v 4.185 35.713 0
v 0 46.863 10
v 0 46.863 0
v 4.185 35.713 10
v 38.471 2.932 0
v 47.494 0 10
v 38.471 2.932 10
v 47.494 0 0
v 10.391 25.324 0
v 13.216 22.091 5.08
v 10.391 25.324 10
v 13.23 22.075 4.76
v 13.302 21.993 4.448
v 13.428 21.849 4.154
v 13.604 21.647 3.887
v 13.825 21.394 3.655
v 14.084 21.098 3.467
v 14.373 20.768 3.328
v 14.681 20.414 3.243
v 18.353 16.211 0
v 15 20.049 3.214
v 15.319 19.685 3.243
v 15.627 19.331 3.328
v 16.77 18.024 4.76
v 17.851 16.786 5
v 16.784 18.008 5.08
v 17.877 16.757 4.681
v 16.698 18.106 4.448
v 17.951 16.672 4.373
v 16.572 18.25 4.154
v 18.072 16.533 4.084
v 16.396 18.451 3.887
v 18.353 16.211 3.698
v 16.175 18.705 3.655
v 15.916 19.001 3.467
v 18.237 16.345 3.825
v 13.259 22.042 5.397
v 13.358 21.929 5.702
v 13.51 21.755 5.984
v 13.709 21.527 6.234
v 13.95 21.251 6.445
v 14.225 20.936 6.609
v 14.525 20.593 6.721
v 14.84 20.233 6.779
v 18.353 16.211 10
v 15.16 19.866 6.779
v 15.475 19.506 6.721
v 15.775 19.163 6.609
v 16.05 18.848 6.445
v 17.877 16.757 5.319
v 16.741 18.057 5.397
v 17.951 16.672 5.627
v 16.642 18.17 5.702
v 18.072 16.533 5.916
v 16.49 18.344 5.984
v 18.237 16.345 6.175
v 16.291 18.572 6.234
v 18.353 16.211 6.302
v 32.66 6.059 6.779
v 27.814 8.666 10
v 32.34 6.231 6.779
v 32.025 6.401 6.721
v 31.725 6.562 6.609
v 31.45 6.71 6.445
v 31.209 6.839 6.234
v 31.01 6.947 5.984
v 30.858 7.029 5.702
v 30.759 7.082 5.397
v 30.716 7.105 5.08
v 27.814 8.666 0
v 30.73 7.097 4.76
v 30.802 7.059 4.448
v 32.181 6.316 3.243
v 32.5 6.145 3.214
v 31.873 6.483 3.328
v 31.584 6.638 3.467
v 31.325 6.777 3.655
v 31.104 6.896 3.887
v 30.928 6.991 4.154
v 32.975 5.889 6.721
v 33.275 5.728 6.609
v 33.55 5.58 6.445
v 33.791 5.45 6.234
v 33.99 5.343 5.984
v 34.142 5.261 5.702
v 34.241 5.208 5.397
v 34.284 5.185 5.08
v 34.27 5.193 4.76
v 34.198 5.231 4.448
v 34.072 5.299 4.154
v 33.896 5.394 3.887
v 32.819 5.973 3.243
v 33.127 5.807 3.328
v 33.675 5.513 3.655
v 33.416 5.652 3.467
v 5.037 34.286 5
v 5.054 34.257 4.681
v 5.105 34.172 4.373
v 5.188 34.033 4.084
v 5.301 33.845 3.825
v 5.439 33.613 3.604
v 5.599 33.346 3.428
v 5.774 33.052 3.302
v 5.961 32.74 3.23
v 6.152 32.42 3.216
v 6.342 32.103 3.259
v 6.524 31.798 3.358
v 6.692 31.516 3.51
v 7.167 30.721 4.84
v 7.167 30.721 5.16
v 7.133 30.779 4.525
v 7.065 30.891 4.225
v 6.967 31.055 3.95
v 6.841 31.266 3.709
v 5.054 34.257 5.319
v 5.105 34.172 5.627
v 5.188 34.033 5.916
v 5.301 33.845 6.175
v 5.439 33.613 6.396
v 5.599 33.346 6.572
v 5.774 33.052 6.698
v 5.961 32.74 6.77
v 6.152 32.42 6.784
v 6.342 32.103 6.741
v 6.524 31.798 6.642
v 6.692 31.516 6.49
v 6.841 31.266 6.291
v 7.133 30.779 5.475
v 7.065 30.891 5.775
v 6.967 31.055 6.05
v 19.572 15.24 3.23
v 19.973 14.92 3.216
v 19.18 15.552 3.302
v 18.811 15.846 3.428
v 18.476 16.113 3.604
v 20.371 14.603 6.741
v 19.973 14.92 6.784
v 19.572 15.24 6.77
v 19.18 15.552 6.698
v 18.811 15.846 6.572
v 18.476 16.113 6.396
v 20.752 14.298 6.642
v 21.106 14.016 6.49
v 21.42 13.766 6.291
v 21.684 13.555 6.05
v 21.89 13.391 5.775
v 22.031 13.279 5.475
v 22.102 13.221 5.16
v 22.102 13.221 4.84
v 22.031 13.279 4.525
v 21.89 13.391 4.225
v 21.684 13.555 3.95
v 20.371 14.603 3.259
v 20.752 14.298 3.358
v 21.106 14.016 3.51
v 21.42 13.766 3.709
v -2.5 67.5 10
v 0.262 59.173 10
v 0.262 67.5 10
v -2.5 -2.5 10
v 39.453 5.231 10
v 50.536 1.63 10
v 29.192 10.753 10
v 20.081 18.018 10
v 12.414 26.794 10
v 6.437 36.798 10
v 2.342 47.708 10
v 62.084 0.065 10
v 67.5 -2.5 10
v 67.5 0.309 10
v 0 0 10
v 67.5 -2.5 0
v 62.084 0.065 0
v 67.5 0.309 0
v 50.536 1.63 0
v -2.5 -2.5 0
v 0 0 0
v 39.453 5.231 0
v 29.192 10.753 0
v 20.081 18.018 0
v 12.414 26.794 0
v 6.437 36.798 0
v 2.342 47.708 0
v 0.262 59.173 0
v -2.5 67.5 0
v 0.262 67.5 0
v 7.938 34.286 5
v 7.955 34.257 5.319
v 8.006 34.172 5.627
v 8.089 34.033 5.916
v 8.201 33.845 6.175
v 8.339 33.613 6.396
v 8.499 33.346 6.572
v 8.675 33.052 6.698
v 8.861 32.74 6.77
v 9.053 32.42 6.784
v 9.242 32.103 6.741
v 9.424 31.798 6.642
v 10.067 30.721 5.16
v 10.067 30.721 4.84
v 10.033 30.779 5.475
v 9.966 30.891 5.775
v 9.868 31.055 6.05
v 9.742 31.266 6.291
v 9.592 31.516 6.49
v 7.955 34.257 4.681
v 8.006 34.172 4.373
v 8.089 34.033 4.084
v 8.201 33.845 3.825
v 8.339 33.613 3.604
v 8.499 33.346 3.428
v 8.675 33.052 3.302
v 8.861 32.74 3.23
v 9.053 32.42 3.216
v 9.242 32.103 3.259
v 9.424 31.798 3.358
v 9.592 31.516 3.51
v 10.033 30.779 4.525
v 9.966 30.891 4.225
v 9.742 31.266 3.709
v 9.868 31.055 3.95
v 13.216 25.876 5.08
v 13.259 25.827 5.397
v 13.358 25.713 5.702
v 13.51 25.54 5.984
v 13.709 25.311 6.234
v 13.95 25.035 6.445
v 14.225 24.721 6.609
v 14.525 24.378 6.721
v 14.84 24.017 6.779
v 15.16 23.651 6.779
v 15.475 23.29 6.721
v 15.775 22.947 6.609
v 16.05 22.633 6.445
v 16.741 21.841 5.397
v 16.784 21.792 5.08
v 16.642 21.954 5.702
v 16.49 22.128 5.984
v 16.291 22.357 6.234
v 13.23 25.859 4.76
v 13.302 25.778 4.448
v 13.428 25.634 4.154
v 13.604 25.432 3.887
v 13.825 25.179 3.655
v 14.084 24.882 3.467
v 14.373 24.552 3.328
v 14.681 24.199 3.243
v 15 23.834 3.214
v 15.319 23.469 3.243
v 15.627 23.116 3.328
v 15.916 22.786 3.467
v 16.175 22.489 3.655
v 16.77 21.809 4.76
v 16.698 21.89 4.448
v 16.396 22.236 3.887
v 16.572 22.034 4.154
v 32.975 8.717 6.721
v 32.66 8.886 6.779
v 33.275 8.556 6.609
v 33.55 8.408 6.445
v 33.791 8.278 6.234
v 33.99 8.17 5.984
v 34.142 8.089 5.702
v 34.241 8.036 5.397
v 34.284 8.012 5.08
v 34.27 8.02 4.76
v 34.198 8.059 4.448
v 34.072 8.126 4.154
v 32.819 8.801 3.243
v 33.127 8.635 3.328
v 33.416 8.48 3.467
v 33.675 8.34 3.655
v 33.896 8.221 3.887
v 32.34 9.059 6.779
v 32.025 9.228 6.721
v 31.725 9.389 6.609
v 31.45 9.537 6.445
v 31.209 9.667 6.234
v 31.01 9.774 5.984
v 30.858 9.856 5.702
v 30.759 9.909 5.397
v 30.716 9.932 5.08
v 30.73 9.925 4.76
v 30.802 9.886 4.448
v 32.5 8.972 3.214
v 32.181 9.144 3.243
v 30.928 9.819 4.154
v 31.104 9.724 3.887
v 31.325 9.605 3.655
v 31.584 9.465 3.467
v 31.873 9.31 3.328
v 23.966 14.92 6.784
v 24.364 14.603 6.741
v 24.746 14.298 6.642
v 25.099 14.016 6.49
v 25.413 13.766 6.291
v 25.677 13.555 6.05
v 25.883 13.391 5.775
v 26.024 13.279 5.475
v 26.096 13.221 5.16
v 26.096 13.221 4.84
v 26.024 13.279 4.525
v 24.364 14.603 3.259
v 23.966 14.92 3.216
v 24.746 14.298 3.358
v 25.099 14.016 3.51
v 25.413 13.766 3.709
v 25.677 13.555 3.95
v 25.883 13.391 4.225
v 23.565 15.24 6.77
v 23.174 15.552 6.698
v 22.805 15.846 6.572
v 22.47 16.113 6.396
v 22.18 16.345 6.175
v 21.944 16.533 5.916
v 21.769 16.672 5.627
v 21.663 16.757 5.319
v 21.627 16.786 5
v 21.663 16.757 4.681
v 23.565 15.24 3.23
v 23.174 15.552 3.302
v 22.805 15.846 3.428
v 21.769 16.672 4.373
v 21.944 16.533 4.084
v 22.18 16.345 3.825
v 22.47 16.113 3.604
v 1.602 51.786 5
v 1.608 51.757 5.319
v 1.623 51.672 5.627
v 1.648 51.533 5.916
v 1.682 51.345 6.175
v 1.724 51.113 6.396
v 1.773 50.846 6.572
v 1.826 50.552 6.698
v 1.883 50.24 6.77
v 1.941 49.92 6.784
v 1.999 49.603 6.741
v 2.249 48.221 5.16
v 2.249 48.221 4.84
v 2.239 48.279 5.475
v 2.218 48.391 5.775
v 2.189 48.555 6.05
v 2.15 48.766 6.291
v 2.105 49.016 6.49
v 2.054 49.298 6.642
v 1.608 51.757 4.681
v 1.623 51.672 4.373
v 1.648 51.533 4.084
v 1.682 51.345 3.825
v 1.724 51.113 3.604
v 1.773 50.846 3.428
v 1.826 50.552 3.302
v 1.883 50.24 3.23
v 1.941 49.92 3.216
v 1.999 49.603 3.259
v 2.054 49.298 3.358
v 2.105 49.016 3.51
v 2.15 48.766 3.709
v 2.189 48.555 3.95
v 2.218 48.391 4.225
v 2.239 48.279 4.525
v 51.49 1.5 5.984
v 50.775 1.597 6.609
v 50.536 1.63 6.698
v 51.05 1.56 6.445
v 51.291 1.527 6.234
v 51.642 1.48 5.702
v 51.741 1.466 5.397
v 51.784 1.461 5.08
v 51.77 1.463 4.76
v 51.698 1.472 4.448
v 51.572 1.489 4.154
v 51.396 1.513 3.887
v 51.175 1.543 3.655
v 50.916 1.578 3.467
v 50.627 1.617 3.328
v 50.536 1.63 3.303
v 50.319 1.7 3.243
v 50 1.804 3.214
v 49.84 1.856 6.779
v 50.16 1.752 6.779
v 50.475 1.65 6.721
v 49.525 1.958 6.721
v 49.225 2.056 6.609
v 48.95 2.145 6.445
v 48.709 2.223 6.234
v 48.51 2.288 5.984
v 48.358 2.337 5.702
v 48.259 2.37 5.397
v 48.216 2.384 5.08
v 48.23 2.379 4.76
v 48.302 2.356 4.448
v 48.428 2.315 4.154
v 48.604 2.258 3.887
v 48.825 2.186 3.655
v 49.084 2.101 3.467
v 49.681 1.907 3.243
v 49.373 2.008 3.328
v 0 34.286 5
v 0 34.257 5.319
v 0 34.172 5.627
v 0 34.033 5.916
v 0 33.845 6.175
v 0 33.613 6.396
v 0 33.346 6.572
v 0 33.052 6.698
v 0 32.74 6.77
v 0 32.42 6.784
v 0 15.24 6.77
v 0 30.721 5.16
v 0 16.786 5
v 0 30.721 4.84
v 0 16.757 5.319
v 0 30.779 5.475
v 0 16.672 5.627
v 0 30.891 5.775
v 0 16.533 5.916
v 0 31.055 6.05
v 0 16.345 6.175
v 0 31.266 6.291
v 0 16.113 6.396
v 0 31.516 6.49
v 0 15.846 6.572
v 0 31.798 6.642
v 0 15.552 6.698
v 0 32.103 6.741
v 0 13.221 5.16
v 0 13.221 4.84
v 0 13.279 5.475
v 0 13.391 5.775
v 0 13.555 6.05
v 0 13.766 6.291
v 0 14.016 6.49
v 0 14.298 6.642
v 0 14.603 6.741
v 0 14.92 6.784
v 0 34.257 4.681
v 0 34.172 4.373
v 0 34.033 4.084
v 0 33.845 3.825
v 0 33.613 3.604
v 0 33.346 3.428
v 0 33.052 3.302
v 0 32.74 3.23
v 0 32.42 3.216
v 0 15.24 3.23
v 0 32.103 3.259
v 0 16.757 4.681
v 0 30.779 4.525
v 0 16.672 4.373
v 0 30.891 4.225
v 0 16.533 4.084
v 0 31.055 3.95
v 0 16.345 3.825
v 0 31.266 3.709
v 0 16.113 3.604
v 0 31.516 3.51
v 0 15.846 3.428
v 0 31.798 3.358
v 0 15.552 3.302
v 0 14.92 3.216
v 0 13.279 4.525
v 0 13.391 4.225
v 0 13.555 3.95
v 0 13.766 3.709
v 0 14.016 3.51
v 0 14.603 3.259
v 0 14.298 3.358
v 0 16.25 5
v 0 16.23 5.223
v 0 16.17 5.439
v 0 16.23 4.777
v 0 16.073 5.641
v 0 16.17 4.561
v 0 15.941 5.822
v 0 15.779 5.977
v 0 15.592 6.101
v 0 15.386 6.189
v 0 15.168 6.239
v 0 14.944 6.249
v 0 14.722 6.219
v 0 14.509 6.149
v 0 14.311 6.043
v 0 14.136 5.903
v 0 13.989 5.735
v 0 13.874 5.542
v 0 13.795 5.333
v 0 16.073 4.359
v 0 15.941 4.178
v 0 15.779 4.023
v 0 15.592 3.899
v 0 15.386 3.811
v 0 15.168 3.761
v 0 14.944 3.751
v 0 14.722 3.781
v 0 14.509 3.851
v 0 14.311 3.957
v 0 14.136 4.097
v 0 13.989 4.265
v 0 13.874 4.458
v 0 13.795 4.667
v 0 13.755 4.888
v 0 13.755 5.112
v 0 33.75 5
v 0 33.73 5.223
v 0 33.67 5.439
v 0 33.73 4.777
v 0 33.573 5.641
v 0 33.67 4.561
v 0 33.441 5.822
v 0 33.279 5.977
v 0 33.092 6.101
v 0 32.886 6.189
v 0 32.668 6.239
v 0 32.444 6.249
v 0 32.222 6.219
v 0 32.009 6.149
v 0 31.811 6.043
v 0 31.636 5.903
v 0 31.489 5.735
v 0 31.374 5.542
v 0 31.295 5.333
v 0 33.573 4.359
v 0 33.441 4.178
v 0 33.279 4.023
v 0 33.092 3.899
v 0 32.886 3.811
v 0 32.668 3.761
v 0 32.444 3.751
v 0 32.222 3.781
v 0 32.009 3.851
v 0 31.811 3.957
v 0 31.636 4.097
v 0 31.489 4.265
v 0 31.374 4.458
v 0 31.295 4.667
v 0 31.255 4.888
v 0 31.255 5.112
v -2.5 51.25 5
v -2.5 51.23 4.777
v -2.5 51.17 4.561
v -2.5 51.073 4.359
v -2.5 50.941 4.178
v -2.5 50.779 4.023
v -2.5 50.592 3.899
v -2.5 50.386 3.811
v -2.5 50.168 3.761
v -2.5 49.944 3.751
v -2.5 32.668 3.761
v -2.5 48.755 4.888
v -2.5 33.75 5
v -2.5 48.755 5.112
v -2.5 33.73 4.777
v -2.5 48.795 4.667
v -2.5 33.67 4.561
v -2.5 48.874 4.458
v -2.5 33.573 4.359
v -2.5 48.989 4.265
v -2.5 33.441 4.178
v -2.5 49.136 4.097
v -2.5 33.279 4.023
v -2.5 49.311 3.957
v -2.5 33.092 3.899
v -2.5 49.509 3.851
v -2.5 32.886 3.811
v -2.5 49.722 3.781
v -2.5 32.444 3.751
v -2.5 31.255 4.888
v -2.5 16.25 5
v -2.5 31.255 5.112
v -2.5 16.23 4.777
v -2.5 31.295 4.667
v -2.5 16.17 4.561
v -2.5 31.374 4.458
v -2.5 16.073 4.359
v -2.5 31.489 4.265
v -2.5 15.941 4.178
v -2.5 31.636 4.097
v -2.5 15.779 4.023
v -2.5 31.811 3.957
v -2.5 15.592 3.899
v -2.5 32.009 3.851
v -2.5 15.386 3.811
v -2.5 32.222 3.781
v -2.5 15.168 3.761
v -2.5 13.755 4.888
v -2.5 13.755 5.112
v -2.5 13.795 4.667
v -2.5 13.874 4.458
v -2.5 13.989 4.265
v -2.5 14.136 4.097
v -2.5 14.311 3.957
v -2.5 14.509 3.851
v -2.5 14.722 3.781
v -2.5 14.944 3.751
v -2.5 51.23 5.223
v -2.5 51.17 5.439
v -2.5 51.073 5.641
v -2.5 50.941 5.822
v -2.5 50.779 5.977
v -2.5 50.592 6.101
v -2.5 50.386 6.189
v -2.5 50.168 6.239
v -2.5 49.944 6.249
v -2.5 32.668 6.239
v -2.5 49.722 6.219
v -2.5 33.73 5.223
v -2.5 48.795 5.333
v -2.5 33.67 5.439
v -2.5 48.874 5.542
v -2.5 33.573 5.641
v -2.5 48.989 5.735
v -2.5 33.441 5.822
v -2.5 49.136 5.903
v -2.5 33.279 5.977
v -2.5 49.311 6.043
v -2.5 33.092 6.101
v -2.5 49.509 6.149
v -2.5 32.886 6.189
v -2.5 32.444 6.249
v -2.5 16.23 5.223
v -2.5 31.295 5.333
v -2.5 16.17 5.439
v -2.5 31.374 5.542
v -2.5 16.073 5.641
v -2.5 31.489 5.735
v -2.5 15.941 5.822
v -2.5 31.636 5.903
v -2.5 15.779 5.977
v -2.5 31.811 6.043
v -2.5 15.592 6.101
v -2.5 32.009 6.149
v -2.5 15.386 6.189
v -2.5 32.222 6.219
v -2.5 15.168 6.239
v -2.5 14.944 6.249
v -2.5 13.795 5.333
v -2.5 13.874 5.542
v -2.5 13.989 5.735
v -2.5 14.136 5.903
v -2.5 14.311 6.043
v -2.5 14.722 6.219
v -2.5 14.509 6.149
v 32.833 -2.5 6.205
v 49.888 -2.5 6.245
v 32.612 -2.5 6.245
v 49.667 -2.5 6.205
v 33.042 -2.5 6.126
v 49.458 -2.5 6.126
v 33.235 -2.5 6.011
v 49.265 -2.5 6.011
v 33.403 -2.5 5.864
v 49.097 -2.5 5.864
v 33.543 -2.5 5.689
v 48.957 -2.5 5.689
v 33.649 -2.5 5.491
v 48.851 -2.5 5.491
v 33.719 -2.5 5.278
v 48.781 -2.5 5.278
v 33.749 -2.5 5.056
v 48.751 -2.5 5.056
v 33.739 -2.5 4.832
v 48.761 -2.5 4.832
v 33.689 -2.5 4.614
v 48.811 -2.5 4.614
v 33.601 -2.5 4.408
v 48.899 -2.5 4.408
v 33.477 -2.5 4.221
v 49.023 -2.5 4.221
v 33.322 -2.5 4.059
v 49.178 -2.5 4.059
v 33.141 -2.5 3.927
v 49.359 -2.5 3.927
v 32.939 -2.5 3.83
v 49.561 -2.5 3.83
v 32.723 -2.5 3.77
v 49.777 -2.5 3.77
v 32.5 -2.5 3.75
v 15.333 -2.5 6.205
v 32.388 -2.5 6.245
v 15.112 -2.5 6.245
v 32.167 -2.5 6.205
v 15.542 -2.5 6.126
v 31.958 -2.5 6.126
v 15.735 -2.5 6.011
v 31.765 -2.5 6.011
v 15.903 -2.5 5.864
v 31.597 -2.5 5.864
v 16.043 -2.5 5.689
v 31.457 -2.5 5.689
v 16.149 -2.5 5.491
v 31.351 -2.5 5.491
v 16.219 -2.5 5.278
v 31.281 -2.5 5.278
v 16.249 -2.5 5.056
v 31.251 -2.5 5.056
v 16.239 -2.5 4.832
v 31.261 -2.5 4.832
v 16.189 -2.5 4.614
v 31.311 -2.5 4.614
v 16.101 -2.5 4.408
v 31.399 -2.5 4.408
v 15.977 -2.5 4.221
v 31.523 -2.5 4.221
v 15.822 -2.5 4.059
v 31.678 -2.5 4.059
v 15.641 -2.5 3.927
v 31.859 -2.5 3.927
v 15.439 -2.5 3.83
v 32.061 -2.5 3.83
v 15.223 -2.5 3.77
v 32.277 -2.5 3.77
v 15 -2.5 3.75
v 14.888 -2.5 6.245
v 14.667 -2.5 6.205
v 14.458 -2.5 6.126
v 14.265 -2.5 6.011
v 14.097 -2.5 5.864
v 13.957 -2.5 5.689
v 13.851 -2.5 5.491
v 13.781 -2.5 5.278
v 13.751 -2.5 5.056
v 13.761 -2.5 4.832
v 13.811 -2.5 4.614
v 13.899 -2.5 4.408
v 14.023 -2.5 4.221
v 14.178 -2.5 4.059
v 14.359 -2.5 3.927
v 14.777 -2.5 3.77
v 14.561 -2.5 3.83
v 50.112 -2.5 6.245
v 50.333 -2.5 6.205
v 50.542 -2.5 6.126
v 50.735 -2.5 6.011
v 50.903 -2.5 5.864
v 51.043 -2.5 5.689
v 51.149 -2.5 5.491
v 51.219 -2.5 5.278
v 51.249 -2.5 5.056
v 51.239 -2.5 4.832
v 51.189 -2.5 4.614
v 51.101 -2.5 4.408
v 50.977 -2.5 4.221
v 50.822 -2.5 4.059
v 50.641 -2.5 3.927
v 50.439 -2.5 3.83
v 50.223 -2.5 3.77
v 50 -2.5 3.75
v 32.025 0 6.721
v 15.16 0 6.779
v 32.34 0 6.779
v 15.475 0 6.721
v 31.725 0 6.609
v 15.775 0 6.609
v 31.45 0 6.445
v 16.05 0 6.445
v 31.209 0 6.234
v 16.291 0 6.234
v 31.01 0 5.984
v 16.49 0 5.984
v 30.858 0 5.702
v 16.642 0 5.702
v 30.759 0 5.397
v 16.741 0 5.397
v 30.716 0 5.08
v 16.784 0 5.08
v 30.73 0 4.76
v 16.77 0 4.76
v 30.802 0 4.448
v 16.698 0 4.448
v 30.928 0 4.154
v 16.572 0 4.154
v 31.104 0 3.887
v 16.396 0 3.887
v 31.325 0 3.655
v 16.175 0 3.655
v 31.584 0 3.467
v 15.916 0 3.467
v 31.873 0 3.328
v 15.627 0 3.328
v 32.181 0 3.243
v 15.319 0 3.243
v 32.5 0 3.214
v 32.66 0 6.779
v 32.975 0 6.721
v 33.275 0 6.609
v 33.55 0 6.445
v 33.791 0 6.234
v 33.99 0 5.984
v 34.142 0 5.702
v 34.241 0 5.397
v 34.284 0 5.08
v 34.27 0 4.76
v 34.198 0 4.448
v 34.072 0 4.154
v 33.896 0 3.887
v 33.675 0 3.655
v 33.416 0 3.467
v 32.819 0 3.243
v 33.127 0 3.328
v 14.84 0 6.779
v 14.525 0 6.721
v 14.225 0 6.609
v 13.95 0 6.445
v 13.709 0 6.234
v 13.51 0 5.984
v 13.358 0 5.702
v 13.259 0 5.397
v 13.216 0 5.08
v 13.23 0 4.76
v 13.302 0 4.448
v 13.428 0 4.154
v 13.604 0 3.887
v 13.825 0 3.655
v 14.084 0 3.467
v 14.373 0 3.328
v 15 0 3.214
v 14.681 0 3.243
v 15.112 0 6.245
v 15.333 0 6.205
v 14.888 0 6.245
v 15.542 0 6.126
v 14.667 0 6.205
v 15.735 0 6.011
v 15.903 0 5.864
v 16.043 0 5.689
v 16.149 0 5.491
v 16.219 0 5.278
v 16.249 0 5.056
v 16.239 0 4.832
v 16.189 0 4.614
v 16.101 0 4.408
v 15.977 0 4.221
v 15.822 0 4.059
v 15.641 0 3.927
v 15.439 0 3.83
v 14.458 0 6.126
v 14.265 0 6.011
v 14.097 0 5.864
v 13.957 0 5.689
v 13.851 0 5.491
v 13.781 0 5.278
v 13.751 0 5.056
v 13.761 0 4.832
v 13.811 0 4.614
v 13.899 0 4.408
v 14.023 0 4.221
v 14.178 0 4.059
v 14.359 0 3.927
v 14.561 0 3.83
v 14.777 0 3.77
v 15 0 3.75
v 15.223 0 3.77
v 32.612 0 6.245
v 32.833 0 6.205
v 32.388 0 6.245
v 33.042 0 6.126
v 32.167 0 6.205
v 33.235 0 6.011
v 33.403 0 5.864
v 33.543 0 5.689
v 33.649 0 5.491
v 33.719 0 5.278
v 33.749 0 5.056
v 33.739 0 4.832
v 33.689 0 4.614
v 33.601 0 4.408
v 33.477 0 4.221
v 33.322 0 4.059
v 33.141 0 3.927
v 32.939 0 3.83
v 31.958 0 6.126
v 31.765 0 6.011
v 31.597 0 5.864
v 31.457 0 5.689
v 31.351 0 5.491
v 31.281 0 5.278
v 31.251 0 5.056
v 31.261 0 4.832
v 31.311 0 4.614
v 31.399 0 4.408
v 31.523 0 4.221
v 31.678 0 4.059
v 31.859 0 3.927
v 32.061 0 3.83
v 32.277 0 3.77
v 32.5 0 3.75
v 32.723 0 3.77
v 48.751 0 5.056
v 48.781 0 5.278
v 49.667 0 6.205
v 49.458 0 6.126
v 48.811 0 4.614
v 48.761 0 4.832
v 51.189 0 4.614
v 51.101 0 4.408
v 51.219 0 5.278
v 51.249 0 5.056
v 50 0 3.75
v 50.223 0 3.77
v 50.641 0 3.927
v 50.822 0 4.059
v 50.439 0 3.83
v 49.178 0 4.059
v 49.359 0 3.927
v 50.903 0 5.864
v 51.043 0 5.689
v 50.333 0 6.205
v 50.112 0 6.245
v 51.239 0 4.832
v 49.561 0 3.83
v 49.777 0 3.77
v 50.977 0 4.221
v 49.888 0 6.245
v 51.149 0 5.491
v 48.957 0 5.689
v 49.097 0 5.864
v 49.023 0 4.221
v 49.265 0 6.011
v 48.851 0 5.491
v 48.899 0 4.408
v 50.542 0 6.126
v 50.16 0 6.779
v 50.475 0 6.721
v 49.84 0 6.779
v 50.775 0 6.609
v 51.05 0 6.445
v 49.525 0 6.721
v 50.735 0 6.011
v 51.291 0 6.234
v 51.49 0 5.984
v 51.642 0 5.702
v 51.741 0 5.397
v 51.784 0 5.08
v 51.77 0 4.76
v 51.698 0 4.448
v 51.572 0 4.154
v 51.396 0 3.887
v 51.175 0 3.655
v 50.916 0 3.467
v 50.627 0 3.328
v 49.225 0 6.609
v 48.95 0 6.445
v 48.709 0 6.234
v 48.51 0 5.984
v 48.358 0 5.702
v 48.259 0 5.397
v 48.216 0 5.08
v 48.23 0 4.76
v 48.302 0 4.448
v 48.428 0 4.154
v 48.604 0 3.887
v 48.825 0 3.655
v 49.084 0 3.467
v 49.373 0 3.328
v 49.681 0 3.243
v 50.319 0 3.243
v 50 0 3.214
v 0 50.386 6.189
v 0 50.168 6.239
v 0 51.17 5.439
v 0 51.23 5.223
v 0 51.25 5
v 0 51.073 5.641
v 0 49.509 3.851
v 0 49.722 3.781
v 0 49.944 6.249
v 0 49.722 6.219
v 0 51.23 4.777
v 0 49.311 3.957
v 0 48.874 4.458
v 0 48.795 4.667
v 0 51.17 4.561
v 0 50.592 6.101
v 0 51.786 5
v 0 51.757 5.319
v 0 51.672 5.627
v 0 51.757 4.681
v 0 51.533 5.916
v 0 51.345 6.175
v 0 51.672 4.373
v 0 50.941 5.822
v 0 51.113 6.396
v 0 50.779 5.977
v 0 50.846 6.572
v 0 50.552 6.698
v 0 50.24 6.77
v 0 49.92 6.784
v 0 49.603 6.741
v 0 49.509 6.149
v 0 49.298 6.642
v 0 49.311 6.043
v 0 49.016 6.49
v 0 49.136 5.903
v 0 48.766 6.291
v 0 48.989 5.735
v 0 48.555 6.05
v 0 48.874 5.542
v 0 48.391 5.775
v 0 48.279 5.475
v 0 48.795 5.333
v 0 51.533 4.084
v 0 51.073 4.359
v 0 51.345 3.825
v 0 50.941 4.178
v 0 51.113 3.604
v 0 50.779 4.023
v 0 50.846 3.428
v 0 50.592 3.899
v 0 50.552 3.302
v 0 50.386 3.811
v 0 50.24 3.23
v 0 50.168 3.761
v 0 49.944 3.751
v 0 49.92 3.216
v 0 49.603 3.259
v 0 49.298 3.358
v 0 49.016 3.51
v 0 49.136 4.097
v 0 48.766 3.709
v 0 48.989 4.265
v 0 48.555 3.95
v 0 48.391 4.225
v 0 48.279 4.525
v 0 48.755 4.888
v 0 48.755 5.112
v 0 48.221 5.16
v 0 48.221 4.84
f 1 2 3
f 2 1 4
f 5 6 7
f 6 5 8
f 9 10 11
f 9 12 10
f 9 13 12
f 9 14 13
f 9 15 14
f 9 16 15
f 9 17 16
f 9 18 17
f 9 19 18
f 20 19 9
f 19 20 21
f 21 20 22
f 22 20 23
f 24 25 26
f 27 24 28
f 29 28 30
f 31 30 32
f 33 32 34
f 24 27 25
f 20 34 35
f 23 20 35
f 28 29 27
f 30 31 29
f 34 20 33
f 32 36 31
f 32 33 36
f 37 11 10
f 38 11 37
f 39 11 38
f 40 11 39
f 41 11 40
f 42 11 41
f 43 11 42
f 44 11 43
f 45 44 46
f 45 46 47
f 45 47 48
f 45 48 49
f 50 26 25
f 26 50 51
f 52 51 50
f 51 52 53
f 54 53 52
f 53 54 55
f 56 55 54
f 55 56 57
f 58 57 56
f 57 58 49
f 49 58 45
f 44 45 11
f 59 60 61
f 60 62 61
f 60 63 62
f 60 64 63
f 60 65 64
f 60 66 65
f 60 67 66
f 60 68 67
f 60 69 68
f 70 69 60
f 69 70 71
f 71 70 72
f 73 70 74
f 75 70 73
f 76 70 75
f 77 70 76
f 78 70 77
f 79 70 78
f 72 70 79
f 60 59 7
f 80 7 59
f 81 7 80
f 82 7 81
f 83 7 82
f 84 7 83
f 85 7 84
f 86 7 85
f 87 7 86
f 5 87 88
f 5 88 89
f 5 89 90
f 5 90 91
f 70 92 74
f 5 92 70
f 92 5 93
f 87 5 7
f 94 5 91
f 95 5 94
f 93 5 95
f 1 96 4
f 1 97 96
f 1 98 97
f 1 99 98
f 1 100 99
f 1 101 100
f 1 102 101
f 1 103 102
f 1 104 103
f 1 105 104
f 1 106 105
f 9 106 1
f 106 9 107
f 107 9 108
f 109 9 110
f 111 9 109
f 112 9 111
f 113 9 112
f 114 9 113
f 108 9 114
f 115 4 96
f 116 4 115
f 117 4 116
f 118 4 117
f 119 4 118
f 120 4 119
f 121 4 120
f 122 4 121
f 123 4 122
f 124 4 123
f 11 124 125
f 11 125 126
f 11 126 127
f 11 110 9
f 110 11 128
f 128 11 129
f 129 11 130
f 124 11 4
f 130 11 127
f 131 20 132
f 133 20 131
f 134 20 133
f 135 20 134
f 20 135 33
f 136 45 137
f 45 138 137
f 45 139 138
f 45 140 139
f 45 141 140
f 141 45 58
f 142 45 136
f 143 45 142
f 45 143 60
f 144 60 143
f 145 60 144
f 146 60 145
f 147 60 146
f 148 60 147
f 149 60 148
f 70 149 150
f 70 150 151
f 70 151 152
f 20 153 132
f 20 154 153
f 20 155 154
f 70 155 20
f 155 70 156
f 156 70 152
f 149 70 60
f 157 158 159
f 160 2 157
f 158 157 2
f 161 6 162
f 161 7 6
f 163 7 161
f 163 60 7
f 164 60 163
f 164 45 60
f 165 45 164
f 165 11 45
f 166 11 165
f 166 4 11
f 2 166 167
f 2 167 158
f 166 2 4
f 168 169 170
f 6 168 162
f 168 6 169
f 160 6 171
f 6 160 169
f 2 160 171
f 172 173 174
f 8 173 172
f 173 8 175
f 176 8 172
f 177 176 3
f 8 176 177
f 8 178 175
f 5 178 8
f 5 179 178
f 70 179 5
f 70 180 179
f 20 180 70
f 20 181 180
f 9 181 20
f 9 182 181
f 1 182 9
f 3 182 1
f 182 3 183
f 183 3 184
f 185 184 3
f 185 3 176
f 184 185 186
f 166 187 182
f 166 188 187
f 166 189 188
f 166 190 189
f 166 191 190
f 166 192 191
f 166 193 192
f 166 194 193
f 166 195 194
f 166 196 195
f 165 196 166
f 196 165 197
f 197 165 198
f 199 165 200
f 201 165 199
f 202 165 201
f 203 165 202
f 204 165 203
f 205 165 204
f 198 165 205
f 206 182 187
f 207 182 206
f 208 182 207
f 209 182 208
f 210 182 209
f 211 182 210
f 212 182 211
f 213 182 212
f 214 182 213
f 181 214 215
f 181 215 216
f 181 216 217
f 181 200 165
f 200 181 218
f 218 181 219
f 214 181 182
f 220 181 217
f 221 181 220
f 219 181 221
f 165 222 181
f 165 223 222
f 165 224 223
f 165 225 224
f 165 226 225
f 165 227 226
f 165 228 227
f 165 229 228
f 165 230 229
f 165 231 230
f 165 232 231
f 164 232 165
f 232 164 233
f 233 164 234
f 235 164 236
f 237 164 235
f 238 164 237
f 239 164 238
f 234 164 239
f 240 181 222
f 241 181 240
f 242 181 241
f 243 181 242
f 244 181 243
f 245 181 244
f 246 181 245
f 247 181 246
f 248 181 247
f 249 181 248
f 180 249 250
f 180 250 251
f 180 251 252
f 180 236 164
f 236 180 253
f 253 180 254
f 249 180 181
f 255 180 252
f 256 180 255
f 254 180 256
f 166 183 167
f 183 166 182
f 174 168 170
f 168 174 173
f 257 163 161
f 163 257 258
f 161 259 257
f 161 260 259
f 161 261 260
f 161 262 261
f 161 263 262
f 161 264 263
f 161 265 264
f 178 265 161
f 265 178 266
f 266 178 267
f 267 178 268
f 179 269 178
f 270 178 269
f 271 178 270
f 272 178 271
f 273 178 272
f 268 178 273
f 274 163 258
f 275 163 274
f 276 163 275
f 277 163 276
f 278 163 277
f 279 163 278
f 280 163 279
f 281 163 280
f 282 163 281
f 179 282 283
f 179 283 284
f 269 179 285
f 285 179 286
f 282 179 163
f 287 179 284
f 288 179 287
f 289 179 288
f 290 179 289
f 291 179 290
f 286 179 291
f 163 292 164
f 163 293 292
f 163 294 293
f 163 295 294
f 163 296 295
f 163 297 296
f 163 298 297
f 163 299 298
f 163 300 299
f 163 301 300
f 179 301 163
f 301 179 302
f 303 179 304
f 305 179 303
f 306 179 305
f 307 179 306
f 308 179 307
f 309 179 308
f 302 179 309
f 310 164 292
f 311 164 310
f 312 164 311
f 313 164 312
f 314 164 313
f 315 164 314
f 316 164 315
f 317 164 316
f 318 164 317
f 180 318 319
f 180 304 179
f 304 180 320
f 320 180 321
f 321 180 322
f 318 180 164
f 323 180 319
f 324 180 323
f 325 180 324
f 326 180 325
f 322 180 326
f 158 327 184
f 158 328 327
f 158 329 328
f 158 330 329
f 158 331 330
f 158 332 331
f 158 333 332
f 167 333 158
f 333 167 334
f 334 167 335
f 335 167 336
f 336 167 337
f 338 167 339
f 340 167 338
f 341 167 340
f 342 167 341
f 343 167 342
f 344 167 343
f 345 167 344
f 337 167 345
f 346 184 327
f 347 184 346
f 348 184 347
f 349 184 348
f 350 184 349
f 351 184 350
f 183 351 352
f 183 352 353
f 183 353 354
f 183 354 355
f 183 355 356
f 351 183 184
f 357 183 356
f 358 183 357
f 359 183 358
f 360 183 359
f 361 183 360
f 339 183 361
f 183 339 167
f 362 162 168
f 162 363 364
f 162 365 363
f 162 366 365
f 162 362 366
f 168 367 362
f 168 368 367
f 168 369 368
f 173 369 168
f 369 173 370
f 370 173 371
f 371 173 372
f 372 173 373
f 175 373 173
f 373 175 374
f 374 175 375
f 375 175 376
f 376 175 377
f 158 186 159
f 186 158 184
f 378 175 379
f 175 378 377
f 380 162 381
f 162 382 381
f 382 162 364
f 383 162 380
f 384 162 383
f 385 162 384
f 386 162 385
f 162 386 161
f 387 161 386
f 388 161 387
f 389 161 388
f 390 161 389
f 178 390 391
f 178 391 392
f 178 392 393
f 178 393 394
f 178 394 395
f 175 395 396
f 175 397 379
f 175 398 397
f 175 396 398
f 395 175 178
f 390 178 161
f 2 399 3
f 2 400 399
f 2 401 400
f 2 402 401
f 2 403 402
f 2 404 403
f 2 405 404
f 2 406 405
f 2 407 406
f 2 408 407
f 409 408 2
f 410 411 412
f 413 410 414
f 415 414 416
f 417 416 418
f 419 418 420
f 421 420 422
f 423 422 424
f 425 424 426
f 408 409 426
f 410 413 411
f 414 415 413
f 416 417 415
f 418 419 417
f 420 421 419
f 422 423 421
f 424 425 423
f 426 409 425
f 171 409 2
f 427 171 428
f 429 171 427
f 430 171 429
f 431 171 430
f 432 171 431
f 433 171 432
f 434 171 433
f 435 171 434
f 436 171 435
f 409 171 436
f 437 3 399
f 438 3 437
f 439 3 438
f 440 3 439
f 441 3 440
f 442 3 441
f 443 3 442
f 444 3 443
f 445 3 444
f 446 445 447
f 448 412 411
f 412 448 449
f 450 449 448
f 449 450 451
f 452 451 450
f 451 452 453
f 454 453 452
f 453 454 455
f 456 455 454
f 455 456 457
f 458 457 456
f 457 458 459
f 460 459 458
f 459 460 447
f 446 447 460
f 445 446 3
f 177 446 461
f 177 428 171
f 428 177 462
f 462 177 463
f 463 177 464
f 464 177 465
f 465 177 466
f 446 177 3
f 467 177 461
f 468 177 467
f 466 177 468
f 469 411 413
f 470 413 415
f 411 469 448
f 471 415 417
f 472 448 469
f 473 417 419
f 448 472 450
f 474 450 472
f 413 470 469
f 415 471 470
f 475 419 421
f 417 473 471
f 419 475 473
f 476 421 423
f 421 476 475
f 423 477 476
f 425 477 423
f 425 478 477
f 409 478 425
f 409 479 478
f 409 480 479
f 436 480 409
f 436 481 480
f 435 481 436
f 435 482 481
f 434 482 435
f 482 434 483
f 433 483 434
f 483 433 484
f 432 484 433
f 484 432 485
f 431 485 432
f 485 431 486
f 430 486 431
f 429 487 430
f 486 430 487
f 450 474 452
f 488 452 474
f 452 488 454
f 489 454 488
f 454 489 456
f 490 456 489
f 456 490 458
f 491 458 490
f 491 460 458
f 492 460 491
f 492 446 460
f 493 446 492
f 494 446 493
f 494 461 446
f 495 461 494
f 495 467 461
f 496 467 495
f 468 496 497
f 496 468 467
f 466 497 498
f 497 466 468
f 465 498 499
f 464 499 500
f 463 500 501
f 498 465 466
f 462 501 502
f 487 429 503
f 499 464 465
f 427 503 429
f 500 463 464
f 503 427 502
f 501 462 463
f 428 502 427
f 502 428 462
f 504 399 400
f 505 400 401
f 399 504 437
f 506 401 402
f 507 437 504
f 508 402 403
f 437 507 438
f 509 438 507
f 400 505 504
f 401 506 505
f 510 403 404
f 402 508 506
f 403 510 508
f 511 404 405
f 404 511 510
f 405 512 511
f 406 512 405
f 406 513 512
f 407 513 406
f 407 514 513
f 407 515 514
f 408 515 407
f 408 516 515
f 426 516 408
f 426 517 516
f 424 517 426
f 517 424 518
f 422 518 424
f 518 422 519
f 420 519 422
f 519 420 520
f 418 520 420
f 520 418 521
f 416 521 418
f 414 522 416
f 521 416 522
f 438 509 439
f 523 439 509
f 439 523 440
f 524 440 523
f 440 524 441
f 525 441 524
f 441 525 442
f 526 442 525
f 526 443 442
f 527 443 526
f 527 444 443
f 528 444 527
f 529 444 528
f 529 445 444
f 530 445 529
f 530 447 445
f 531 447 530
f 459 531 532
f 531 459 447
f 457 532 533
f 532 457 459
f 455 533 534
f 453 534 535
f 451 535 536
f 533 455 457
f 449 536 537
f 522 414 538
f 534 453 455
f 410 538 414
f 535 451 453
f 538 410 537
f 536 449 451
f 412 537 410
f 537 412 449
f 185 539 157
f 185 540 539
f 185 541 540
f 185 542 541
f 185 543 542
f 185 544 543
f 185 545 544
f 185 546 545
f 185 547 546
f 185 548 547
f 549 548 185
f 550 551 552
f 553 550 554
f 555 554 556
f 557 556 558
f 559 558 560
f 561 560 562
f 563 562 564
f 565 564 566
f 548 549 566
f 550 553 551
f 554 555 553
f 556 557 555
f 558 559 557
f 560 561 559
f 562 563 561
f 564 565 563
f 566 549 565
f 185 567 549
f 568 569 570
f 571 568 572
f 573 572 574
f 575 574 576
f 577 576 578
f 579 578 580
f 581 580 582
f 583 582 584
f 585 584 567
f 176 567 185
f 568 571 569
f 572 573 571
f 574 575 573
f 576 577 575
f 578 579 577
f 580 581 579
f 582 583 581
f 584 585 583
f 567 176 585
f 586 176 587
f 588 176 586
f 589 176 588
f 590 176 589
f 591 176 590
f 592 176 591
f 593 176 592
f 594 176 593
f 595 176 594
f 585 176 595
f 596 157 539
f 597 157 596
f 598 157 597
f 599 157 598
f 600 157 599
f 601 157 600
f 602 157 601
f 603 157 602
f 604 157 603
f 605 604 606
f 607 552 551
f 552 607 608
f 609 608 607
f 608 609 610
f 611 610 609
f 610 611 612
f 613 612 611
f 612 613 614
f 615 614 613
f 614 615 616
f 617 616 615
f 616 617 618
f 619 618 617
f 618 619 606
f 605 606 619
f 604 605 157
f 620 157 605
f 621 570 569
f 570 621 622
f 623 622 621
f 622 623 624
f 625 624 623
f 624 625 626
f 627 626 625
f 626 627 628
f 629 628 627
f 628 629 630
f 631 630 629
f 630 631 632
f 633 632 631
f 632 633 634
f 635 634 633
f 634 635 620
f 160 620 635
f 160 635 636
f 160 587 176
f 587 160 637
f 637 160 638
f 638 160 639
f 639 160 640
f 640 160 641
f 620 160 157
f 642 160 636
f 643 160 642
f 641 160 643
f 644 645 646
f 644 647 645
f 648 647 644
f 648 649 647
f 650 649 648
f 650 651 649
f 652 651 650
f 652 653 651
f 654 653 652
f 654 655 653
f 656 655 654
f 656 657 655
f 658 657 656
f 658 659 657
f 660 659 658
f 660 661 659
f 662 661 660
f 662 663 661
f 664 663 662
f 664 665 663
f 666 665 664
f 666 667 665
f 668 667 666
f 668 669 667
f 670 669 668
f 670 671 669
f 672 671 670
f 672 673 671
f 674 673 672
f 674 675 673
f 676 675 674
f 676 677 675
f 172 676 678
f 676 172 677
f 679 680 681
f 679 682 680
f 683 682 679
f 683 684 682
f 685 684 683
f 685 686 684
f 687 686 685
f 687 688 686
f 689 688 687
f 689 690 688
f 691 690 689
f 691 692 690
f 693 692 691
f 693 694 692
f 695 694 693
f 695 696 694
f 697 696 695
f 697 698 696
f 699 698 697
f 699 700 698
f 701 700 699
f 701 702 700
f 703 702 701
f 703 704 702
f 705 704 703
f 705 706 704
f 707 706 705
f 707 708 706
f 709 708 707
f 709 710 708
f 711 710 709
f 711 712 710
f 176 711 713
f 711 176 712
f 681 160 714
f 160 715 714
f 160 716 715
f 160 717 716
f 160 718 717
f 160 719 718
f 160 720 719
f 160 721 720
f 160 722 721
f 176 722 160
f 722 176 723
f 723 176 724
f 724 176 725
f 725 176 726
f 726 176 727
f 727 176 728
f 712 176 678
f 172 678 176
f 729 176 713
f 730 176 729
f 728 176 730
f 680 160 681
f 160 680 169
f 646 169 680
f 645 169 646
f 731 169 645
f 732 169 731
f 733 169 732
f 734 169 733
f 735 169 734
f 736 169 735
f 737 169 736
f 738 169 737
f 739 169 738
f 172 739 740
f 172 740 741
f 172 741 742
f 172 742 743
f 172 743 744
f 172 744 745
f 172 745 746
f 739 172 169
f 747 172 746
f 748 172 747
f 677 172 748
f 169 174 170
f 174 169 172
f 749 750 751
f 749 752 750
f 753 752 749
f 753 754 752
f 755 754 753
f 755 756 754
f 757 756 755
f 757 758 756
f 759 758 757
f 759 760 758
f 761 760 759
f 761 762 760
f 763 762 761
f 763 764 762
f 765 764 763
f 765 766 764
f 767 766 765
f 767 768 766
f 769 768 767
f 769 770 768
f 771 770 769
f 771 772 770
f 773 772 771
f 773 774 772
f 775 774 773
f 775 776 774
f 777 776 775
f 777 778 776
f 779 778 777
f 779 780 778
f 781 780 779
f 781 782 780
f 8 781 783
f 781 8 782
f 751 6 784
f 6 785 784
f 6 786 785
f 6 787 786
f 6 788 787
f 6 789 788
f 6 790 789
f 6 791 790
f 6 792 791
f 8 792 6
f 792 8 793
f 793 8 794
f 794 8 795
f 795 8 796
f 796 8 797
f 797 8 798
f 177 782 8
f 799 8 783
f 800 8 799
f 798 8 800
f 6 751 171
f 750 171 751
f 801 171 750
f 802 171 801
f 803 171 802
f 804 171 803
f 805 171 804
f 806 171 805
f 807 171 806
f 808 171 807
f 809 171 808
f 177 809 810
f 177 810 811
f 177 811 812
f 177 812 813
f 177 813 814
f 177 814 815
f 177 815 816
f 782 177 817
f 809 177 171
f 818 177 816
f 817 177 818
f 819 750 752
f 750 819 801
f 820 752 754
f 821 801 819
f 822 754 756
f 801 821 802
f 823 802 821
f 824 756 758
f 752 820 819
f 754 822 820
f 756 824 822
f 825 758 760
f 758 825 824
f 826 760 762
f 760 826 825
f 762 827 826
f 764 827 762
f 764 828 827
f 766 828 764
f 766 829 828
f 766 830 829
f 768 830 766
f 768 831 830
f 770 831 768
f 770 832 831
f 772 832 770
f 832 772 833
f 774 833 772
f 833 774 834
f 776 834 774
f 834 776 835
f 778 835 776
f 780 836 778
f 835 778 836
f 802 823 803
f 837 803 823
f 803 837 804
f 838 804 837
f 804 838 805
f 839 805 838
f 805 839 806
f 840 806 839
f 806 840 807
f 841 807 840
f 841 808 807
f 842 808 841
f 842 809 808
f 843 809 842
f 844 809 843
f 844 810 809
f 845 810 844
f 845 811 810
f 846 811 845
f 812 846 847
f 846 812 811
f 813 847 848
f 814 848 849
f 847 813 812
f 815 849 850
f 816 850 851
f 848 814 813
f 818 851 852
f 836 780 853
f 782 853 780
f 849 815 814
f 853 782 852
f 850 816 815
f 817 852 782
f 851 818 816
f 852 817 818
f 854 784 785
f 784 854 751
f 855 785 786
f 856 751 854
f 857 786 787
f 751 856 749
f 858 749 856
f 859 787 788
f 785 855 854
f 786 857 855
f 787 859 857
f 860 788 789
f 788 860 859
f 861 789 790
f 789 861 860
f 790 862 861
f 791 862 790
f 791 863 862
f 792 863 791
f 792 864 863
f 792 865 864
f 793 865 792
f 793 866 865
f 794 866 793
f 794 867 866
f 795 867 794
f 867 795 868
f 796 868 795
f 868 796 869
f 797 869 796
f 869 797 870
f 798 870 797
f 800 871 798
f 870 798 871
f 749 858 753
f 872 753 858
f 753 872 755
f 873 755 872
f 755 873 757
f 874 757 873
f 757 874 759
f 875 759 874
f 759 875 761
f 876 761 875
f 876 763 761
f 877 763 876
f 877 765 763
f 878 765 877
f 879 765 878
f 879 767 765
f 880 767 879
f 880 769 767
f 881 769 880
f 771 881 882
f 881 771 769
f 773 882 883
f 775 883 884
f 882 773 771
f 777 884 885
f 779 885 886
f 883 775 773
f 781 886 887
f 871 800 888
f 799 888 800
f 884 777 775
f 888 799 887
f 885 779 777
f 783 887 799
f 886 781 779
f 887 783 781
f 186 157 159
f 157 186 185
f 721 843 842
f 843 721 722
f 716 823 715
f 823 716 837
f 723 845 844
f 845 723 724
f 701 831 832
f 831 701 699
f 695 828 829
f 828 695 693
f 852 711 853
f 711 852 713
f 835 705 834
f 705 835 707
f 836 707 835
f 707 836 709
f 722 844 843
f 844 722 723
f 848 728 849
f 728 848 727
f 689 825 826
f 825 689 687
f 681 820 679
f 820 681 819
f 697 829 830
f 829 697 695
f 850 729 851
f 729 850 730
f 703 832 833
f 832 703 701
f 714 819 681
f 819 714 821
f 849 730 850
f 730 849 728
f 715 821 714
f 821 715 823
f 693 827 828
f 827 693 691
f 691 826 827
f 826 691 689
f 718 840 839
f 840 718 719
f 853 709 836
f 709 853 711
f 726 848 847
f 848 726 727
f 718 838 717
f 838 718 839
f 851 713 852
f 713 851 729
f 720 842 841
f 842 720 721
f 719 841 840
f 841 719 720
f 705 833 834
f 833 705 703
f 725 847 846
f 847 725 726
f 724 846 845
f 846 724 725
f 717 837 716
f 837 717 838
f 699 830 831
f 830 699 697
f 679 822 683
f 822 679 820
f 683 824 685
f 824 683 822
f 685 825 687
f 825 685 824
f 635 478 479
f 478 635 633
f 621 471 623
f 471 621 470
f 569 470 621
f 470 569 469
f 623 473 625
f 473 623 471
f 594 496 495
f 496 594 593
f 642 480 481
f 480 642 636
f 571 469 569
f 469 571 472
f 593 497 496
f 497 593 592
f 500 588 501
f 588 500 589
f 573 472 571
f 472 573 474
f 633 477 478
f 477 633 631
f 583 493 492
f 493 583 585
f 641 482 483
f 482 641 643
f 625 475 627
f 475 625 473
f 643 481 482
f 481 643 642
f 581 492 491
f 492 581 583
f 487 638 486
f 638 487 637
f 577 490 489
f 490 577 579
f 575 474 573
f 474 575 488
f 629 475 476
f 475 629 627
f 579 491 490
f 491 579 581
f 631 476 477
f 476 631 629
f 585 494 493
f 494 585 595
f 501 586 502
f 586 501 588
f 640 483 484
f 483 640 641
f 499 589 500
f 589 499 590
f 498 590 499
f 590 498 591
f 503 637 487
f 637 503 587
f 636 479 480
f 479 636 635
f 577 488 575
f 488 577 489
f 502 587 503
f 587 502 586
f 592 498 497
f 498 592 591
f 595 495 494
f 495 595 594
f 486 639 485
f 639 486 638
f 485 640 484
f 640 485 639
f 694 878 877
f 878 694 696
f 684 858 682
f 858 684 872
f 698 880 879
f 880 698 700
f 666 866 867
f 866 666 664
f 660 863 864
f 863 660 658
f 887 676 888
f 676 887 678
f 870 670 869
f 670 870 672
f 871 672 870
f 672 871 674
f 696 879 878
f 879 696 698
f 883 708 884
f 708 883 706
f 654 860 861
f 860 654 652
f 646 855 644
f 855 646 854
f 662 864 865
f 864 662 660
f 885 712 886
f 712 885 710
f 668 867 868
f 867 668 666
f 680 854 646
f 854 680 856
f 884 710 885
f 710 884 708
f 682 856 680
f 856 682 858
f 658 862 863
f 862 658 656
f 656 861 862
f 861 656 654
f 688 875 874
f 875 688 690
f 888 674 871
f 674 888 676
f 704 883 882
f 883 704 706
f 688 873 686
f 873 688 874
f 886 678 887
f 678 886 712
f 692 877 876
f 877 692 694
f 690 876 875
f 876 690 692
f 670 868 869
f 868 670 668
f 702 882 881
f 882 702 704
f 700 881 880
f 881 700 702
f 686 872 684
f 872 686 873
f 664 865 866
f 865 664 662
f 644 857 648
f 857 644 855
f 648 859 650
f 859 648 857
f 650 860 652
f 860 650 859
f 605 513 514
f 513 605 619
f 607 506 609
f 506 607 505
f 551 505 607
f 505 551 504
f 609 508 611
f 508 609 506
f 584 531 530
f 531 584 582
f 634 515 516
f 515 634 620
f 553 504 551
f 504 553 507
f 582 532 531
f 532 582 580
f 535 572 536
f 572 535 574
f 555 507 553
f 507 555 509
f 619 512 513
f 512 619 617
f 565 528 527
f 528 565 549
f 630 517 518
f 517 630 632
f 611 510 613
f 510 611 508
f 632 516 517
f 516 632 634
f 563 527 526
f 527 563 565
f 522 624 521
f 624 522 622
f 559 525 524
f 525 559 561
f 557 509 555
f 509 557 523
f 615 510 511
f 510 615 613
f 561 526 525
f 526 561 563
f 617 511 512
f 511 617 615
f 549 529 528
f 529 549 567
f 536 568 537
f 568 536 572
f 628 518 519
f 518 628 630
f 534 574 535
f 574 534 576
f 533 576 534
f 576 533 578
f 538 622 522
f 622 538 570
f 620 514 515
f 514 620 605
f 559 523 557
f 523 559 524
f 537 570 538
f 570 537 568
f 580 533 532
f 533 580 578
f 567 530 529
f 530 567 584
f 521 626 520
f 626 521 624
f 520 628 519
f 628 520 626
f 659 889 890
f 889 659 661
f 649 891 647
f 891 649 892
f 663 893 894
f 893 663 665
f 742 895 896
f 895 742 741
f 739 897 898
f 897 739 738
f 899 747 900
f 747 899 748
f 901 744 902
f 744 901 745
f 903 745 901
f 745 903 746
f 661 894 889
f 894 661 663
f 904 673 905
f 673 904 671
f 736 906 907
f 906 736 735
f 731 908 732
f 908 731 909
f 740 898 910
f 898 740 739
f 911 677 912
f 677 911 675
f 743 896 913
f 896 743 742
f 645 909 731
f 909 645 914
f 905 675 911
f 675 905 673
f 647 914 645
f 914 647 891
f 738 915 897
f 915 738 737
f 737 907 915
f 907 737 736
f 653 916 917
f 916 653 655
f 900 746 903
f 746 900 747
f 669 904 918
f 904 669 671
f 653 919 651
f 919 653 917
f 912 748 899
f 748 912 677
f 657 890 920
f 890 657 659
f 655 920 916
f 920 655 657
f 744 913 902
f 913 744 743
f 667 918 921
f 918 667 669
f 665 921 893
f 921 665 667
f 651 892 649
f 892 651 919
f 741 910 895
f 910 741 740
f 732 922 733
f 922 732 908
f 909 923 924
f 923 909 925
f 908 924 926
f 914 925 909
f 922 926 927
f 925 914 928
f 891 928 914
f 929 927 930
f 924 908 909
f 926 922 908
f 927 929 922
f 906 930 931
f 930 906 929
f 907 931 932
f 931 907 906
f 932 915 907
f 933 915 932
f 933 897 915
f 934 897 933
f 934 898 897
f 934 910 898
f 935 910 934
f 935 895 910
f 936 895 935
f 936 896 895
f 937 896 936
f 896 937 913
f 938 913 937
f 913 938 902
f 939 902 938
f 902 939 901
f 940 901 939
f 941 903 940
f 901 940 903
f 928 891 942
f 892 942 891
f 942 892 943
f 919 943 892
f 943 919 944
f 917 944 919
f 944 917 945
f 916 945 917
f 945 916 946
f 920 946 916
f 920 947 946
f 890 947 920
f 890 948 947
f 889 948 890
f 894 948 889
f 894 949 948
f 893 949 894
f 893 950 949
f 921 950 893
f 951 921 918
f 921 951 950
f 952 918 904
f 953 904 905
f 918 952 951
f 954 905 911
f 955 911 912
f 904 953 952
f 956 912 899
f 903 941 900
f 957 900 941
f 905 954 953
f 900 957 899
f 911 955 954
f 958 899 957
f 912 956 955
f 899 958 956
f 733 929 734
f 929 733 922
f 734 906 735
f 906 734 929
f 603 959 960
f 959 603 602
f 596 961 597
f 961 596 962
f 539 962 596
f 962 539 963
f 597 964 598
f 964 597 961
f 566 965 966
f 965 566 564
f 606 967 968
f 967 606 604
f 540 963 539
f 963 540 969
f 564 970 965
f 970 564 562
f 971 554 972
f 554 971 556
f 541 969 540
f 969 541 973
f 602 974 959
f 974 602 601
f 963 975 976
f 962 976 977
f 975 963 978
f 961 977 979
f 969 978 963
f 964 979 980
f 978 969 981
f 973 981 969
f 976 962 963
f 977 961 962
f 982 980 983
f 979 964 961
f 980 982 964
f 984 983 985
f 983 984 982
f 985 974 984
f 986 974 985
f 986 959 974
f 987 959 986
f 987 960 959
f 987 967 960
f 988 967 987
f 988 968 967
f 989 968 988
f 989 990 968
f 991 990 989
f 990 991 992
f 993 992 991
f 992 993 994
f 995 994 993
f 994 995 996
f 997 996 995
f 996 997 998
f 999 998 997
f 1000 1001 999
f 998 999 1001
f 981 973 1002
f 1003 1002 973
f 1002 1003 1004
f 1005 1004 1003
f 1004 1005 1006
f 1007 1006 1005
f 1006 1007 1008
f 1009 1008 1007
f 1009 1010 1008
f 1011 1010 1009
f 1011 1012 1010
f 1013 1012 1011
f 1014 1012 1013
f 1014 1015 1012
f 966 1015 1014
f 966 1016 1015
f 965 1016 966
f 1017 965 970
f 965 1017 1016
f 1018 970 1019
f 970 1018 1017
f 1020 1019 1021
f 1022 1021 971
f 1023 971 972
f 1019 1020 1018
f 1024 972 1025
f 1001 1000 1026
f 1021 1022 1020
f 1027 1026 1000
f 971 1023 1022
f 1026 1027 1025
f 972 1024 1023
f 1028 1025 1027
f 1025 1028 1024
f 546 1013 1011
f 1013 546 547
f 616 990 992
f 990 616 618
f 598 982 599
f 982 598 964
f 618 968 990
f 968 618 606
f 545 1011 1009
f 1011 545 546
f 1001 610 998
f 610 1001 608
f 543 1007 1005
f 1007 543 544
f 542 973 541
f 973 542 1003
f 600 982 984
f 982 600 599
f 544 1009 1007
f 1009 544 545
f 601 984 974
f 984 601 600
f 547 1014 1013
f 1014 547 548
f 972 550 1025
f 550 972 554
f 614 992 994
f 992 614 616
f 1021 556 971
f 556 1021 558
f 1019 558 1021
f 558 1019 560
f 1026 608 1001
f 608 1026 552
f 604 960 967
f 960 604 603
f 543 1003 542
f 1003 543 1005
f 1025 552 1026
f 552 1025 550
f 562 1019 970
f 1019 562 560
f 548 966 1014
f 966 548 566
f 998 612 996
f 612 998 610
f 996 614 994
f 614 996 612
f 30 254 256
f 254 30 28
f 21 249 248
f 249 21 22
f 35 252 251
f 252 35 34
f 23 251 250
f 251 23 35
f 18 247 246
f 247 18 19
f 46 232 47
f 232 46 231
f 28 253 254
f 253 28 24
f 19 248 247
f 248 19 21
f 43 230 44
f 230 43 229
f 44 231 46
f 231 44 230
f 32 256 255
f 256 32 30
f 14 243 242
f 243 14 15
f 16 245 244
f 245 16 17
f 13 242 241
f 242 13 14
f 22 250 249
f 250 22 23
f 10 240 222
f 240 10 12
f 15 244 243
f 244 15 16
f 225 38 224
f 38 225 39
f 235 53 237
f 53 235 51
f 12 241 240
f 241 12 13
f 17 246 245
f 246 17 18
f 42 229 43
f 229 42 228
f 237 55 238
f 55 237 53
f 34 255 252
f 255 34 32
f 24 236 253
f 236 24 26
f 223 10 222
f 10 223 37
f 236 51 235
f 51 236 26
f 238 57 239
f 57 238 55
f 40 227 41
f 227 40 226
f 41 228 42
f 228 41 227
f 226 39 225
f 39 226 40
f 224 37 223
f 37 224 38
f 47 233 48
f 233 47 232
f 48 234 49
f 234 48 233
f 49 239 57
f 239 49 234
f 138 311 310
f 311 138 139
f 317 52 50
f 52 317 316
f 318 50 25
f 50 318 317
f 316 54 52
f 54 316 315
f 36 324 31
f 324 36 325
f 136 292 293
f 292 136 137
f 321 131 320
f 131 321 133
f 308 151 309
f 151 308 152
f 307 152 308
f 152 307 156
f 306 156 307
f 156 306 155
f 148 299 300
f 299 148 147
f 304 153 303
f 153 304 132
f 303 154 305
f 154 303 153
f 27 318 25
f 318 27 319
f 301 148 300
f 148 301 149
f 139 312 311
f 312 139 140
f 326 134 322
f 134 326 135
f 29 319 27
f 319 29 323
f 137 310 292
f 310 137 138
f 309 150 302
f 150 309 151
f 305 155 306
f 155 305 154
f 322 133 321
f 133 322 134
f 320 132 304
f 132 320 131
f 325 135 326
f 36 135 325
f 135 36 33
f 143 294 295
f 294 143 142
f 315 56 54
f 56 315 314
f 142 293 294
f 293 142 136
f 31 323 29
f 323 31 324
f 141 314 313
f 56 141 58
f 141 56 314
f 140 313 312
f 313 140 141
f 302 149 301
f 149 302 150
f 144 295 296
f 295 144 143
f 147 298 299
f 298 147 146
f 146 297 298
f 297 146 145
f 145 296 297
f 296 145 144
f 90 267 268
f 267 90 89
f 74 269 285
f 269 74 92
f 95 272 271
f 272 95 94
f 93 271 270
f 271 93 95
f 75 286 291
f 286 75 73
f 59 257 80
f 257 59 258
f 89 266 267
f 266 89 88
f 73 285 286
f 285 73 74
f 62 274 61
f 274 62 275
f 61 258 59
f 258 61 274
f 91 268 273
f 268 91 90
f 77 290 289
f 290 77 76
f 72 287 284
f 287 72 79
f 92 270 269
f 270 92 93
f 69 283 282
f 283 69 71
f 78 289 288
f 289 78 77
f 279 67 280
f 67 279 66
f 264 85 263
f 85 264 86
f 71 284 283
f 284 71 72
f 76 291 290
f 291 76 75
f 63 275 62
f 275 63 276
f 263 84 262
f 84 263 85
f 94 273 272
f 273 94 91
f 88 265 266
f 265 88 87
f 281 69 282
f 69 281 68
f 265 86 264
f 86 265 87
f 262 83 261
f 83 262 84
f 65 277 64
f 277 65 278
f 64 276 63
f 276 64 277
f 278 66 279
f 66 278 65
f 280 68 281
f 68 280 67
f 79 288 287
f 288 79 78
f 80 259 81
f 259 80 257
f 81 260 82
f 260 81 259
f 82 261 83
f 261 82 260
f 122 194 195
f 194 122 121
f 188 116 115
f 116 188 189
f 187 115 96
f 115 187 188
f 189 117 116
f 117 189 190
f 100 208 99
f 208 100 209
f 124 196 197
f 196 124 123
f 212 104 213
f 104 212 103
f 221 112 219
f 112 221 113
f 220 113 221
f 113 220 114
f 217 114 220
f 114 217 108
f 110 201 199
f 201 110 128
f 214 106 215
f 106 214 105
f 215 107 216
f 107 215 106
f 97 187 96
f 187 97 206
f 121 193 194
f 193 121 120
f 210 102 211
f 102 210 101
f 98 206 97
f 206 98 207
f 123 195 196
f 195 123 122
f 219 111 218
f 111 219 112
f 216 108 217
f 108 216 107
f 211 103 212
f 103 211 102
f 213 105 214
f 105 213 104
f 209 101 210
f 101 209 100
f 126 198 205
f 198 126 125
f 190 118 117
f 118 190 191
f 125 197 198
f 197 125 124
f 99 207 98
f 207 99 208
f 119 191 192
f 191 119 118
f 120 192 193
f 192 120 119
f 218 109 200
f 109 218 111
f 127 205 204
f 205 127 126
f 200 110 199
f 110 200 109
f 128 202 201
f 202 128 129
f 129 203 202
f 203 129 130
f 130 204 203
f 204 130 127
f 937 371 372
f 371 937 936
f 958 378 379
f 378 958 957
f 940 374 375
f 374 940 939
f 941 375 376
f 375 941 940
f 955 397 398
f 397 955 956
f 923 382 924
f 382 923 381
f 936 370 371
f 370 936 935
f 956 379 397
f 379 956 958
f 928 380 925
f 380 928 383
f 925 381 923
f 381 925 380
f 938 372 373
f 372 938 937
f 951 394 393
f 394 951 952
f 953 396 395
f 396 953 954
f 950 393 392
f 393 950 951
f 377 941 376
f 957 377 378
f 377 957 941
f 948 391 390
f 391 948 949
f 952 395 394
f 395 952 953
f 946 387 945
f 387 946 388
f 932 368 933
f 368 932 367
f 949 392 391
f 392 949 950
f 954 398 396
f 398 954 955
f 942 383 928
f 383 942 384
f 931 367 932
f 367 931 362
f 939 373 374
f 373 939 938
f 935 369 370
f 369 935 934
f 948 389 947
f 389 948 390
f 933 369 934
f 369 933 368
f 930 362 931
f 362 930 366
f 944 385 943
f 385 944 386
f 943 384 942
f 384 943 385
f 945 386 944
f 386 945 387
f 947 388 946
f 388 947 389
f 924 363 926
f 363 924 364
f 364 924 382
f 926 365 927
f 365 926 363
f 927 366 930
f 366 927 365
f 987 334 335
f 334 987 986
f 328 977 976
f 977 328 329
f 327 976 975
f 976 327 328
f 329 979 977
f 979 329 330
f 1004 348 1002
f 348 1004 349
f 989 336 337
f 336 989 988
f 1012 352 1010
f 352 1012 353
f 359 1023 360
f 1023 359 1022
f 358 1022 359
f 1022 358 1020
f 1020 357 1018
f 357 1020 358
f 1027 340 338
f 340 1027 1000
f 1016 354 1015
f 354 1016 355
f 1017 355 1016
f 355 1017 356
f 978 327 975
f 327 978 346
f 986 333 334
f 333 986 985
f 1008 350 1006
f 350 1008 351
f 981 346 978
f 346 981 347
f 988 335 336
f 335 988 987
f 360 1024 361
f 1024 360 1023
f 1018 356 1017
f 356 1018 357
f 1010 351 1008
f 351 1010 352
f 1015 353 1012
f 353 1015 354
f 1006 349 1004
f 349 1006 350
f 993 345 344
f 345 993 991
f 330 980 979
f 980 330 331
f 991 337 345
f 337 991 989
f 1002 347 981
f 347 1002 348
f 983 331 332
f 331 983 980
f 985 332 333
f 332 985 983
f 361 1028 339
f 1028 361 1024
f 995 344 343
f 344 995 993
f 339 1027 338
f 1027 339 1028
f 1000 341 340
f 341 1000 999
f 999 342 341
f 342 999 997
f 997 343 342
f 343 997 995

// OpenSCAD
// [FL_INDEX: keywords="openscad, 3d_parametric, Bracket_generator_parameterized, csg_solid" | COT="Parametric OpenSCAD design from 3DCodeverse"]
// Title: Bracket generator parameterized

//length of bracket
length = 70;		
//width of bracket	
width = 10;		
//thickness 
thickness = 2.5;	
//number of holes
holecount=3;	
//hole diameter
holediameter=2.5;
//Make outer holes (1=true 0=false)
outers=1;

module Bracket(l,w,t) {
$fn=35;
intersection(){
	difference() {
		union() {
			translate([-t,-t,0]) cube( size=[t,t+1,w]);
			translate([0,-t,0]) cube( size=[l,t,w]);
			rotate ([0,0,90]) cube( size=[l,t,w]);
			translate ([l-t,l-t,0]) hoop(l,w,t);
			}
		smallholes();
		if (outers) largeholes();
		}
	translate([-t,-t,-1]) cube ( size=[l+t,l+t,w+2]); //cylinder(h=w+2,r1=l,r2=l);
	
	}
}

module hoop(l,w,t) {
n=20;
difference(){
			cylinder(h=w,r1=l,r2=l) ;
			cylinder(h=w,r1=l-t,r2=l-t) ;
		}
}

module smallholes() {
	n=length/(holecount+1);
   for (i=[0:holecount-1]) {
		//x axis
		translate ([n-thickness+i*n,0,width/2]) rotate(a=[90,90,0]) cylinder(h=thickness+1,r1=holediameter/2,r2=holediameter/2);
		// y axis		
		translate ([-thickness,n-thickness+i*n,width/2]) rotate([90,0,90]) cylinder(h=thickness,r1=holediameter/2,r2=holediameter/2);		

	}

}
module largeholes() {
	lhm=1.4; //large hole factor
	n=length/(holecount+1);
   for (i=[0:holecount-1]) {
		//x axis
		translate ([n-thickness+i*n,length,width/2]) rotate(a=[90,90,0]) cylinder(h=length,r1=holediameter/lhm,r2=holediameter/lhm);
		// y axis		
		translate ([0,n-thickness+i*n,width/2]) rotate([90,0,90]) cylinder(h=length,r1=holediameter/lhm,r2=holediameter/lhm);		
	}

}


Bracket(length-thickness,width,thickness);
